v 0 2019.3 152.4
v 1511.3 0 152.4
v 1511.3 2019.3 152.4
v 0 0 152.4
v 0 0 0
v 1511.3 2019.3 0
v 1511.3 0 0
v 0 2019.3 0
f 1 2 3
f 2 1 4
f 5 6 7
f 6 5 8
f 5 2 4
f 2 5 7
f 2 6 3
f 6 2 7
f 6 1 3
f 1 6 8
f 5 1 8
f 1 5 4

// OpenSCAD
// file: ../lib/colors.scad
module color_wood() {
  color("#f2ba52")
    children();
}

module color_hdpe() {
  color("#ccd")
    children();
}

module color_steel() {
  color("#888")
    children();
}

module color_white() {
  color("#fafafa")
    children();
}
// file: ../lib/convert.scad
function inches(in) = in * 25.4;
function feet(ft) = inches(ft * 12);
// main file
use <../lib/convert.scad>
use <../lib/colors.scad>

module mattress() {
  color_white()
    cube([inches(59.5), inches(79.5), inches(6)]);
}

mattress();
